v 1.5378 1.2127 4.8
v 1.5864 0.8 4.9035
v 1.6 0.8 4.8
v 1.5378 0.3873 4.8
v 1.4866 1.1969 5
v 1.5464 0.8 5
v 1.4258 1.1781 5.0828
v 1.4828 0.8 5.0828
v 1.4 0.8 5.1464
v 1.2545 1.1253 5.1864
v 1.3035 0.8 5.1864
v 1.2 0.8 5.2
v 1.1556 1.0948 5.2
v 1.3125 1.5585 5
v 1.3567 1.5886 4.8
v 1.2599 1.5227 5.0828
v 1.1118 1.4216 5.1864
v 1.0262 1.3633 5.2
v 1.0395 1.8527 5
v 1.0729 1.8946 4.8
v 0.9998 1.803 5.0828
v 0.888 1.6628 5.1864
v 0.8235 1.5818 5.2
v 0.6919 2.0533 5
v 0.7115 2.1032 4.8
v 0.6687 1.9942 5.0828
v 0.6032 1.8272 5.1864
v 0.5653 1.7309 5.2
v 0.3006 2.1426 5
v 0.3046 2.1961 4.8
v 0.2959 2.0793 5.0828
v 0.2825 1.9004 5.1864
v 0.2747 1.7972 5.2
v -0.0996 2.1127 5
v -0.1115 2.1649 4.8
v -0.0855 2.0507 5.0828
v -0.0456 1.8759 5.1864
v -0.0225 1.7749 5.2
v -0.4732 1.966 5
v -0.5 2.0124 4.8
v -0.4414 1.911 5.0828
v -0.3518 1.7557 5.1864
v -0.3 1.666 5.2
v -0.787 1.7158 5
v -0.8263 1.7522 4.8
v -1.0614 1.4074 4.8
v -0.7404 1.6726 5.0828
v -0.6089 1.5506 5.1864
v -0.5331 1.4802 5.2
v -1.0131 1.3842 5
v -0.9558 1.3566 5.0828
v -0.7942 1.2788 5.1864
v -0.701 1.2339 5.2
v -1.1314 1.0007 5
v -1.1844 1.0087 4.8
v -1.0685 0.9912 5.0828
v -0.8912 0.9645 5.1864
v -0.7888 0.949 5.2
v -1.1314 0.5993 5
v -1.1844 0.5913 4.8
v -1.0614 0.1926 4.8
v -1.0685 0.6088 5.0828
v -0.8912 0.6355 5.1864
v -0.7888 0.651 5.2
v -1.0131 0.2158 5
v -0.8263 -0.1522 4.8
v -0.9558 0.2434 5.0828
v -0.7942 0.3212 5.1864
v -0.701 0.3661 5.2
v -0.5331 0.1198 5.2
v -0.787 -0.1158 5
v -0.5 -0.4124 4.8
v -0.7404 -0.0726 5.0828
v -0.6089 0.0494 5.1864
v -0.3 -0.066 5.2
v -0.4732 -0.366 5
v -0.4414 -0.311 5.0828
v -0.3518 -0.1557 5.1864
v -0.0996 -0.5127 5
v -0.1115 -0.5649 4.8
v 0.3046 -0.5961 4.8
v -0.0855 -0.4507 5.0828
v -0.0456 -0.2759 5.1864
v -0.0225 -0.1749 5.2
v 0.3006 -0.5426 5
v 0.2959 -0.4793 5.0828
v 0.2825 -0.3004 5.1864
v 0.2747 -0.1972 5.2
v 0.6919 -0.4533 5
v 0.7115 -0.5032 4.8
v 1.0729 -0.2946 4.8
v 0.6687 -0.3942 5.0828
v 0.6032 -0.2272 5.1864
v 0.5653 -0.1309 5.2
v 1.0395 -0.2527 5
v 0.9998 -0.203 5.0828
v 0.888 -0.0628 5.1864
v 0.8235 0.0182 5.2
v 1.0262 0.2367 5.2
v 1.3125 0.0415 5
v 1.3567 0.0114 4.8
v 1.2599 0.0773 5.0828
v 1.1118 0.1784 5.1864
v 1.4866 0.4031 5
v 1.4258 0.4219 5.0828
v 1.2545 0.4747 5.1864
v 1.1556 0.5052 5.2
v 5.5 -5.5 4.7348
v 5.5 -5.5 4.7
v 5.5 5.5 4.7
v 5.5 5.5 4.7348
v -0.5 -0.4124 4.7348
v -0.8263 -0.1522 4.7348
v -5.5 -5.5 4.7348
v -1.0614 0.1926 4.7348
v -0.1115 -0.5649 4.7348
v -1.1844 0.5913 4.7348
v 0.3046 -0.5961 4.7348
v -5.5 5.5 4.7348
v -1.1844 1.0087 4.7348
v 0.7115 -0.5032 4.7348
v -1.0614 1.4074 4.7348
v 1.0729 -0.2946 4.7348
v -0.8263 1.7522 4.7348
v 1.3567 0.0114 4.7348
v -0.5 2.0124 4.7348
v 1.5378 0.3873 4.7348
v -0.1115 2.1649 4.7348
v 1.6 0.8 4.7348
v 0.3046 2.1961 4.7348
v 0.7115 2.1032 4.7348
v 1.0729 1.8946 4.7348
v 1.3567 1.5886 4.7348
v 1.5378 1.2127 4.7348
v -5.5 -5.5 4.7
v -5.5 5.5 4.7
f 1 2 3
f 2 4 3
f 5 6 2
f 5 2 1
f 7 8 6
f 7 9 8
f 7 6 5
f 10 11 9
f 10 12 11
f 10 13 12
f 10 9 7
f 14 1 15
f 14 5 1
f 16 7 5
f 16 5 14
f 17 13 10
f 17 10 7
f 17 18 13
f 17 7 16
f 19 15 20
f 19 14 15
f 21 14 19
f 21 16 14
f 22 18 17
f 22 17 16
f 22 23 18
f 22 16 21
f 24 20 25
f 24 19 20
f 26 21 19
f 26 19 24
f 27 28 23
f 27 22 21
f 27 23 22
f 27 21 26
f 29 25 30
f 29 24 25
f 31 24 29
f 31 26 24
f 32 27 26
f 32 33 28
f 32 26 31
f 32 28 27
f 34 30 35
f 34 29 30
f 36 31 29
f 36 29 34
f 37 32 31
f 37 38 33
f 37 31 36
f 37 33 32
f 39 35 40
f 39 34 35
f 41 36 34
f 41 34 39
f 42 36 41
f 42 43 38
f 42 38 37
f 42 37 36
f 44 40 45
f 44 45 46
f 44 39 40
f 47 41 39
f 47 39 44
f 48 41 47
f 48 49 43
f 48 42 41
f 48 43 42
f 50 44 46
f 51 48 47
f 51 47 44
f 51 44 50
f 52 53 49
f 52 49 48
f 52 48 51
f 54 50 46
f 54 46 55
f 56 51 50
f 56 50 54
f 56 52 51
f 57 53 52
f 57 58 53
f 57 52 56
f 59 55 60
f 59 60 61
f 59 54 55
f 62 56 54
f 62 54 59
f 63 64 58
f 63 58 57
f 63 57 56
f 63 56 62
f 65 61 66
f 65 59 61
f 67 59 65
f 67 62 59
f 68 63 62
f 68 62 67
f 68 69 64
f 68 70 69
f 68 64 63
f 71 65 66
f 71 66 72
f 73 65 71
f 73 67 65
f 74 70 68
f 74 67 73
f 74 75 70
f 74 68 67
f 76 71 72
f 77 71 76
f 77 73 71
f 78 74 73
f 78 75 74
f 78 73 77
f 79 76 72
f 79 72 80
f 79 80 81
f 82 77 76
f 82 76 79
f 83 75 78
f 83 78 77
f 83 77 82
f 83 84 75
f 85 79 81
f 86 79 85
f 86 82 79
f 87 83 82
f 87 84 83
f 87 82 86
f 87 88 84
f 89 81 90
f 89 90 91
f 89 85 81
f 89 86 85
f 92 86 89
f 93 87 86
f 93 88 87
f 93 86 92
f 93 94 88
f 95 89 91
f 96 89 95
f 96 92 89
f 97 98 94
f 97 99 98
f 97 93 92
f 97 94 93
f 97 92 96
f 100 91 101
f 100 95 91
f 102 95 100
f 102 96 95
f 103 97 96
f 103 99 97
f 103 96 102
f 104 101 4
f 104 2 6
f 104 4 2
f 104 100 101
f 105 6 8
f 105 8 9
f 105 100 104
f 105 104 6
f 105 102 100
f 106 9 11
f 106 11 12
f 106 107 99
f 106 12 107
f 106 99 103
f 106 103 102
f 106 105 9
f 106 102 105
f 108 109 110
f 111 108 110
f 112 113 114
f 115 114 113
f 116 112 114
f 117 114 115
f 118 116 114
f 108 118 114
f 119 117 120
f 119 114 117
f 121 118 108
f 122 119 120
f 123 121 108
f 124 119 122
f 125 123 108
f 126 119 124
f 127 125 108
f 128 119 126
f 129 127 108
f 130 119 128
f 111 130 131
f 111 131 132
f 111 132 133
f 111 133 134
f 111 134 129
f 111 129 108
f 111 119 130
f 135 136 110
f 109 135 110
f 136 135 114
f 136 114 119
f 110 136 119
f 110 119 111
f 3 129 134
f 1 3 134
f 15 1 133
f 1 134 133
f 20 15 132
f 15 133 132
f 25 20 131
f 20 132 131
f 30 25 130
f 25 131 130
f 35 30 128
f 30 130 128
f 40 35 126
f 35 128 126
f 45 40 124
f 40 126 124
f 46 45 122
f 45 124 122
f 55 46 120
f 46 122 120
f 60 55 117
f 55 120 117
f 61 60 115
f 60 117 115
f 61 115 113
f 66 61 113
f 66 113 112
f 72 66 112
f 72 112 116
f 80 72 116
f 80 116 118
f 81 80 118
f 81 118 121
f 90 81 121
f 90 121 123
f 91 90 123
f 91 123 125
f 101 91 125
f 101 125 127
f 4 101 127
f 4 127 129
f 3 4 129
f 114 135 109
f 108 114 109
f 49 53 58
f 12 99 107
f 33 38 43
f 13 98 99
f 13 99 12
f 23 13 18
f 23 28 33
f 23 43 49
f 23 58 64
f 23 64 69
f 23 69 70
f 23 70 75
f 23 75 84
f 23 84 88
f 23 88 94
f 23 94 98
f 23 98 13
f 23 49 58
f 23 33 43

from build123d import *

# Parameters (mm, degrees)
SKETCH006_W  = 11
SKETCH006_H  = 11
PAD003_DEPTH = 0.0348
SKETCH007_R  = 1.4
PAD004_DEPTH = 0.5
FILLET_R     = 0.4


with BuildPart() as part:
    # Sketch006 → Pad003 (new body)
    with BuildSketch(Plane.XY):
        Rectangle(SKETCH006_W, SKETCH006_H)
    extrude(amount=PAD003_DEPTH)

    # Sketch007 → Pad004 (join)
    with BuildSketch(Plane.XY):
        with Locations((0.2, 0.8)):
            Circle(SKETCH007_R)
    extrude(amount=PAD004_DEPTH)

    # Fillet
    fillet_edges = [part.edges().sort_by_distance(p)[0] for p in [
        (-1.2, 0.8, 0.5),
    ]]
    fillet(fillet_edges, radius=FILLET_R)


with BuildPart() as part_1:
    # Body003 placement: moved
    add(part.part.moved(Location((0, 0, 4.7))))


solid = part_1.part
